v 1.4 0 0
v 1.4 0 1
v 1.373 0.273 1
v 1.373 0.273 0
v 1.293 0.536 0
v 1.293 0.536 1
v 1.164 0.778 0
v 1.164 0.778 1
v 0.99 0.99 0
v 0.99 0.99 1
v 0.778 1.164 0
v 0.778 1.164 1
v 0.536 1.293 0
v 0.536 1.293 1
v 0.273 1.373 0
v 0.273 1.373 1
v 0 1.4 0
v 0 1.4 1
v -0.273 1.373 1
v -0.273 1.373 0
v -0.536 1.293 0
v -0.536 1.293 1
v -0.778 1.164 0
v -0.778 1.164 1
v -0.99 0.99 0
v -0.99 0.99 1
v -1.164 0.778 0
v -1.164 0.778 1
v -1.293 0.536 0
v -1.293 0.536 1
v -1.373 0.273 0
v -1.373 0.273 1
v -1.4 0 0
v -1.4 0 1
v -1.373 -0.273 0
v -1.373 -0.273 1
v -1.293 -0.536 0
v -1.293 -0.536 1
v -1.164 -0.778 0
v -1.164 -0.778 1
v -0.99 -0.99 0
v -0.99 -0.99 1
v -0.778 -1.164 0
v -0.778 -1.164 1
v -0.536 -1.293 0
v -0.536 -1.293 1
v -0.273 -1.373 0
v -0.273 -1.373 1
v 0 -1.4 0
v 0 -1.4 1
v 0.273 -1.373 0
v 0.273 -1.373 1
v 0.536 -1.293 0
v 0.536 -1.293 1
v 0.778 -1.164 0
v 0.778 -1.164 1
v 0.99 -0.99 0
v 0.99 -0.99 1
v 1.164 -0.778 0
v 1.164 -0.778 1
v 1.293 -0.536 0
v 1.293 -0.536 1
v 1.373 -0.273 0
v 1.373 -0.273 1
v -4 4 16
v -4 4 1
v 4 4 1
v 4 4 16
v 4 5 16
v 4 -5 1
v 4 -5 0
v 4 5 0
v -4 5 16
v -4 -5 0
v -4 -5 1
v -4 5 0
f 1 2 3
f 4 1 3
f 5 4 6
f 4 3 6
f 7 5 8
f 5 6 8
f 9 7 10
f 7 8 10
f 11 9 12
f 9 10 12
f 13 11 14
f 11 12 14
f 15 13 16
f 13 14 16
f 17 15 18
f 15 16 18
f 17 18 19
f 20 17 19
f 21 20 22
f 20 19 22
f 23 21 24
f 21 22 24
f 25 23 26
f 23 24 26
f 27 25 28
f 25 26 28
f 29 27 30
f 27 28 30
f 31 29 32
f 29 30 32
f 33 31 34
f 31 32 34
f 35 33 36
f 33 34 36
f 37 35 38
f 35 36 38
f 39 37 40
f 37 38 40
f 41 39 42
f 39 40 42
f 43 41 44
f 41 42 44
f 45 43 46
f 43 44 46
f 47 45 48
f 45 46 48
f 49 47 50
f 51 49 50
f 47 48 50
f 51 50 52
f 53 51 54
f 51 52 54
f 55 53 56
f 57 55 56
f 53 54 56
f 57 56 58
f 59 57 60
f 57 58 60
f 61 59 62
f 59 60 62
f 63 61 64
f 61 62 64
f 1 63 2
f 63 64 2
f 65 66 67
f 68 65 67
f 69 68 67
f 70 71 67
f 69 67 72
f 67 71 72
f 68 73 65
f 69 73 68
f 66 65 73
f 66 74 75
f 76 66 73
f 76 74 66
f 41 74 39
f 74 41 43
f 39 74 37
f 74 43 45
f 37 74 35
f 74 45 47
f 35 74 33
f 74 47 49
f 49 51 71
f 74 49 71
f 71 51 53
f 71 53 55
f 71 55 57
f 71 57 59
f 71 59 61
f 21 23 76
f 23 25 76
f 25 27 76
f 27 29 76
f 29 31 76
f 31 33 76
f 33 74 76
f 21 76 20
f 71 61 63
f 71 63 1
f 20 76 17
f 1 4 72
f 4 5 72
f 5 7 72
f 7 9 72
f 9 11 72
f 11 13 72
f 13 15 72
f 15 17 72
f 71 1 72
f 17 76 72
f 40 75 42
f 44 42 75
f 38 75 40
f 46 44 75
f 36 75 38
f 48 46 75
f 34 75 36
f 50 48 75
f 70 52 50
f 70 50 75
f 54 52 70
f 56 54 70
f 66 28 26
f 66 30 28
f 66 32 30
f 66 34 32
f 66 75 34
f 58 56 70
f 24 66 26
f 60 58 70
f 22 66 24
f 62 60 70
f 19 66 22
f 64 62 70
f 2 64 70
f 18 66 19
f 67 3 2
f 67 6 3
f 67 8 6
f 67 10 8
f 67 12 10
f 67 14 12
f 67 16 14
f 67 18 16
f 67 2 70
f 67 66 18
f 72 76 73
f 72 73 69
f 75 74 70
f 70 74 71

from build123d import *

# Parameters (mm, degrees)
SKETCH_W     = 8
SKETCH_H     = 10
PAD_DEPTH    = 1
SKETCH001_W  = 8
SKETCH001_H  = 1
PAD001_DEPTH = 15
SKETCH002_R  = 1.4
POCKET_DEPTH = 1


with BuildPart() as part:
    # Sketch → Pad (new body)
    with BuildSketch(Plane.XY):
        Rectangle(SKETCH_W, SKETCH_H)
    extrude(amount=PAD_DEPTH)

    # Sketch001 (on Face6 of Pad) → Pad001 (join)
    with BuildSketch(Plane.XY.offset(1)):
        with Locations((0, 4.5)):
            Rectangle(SKETCH001_W, SKETCH001_H)
    extrude(amount=PAD001_DEPTH)

    # Sketch002 (on Face5 of Pad001) → Pocket (cut)
    with BuildSketch(Plane.XY.offset(1)):
        Circle(SKETCH002_R)
    extrude(amount=-POCKET_DEPTH, mode=Mode.SUBTRACT)


solid = part.part
